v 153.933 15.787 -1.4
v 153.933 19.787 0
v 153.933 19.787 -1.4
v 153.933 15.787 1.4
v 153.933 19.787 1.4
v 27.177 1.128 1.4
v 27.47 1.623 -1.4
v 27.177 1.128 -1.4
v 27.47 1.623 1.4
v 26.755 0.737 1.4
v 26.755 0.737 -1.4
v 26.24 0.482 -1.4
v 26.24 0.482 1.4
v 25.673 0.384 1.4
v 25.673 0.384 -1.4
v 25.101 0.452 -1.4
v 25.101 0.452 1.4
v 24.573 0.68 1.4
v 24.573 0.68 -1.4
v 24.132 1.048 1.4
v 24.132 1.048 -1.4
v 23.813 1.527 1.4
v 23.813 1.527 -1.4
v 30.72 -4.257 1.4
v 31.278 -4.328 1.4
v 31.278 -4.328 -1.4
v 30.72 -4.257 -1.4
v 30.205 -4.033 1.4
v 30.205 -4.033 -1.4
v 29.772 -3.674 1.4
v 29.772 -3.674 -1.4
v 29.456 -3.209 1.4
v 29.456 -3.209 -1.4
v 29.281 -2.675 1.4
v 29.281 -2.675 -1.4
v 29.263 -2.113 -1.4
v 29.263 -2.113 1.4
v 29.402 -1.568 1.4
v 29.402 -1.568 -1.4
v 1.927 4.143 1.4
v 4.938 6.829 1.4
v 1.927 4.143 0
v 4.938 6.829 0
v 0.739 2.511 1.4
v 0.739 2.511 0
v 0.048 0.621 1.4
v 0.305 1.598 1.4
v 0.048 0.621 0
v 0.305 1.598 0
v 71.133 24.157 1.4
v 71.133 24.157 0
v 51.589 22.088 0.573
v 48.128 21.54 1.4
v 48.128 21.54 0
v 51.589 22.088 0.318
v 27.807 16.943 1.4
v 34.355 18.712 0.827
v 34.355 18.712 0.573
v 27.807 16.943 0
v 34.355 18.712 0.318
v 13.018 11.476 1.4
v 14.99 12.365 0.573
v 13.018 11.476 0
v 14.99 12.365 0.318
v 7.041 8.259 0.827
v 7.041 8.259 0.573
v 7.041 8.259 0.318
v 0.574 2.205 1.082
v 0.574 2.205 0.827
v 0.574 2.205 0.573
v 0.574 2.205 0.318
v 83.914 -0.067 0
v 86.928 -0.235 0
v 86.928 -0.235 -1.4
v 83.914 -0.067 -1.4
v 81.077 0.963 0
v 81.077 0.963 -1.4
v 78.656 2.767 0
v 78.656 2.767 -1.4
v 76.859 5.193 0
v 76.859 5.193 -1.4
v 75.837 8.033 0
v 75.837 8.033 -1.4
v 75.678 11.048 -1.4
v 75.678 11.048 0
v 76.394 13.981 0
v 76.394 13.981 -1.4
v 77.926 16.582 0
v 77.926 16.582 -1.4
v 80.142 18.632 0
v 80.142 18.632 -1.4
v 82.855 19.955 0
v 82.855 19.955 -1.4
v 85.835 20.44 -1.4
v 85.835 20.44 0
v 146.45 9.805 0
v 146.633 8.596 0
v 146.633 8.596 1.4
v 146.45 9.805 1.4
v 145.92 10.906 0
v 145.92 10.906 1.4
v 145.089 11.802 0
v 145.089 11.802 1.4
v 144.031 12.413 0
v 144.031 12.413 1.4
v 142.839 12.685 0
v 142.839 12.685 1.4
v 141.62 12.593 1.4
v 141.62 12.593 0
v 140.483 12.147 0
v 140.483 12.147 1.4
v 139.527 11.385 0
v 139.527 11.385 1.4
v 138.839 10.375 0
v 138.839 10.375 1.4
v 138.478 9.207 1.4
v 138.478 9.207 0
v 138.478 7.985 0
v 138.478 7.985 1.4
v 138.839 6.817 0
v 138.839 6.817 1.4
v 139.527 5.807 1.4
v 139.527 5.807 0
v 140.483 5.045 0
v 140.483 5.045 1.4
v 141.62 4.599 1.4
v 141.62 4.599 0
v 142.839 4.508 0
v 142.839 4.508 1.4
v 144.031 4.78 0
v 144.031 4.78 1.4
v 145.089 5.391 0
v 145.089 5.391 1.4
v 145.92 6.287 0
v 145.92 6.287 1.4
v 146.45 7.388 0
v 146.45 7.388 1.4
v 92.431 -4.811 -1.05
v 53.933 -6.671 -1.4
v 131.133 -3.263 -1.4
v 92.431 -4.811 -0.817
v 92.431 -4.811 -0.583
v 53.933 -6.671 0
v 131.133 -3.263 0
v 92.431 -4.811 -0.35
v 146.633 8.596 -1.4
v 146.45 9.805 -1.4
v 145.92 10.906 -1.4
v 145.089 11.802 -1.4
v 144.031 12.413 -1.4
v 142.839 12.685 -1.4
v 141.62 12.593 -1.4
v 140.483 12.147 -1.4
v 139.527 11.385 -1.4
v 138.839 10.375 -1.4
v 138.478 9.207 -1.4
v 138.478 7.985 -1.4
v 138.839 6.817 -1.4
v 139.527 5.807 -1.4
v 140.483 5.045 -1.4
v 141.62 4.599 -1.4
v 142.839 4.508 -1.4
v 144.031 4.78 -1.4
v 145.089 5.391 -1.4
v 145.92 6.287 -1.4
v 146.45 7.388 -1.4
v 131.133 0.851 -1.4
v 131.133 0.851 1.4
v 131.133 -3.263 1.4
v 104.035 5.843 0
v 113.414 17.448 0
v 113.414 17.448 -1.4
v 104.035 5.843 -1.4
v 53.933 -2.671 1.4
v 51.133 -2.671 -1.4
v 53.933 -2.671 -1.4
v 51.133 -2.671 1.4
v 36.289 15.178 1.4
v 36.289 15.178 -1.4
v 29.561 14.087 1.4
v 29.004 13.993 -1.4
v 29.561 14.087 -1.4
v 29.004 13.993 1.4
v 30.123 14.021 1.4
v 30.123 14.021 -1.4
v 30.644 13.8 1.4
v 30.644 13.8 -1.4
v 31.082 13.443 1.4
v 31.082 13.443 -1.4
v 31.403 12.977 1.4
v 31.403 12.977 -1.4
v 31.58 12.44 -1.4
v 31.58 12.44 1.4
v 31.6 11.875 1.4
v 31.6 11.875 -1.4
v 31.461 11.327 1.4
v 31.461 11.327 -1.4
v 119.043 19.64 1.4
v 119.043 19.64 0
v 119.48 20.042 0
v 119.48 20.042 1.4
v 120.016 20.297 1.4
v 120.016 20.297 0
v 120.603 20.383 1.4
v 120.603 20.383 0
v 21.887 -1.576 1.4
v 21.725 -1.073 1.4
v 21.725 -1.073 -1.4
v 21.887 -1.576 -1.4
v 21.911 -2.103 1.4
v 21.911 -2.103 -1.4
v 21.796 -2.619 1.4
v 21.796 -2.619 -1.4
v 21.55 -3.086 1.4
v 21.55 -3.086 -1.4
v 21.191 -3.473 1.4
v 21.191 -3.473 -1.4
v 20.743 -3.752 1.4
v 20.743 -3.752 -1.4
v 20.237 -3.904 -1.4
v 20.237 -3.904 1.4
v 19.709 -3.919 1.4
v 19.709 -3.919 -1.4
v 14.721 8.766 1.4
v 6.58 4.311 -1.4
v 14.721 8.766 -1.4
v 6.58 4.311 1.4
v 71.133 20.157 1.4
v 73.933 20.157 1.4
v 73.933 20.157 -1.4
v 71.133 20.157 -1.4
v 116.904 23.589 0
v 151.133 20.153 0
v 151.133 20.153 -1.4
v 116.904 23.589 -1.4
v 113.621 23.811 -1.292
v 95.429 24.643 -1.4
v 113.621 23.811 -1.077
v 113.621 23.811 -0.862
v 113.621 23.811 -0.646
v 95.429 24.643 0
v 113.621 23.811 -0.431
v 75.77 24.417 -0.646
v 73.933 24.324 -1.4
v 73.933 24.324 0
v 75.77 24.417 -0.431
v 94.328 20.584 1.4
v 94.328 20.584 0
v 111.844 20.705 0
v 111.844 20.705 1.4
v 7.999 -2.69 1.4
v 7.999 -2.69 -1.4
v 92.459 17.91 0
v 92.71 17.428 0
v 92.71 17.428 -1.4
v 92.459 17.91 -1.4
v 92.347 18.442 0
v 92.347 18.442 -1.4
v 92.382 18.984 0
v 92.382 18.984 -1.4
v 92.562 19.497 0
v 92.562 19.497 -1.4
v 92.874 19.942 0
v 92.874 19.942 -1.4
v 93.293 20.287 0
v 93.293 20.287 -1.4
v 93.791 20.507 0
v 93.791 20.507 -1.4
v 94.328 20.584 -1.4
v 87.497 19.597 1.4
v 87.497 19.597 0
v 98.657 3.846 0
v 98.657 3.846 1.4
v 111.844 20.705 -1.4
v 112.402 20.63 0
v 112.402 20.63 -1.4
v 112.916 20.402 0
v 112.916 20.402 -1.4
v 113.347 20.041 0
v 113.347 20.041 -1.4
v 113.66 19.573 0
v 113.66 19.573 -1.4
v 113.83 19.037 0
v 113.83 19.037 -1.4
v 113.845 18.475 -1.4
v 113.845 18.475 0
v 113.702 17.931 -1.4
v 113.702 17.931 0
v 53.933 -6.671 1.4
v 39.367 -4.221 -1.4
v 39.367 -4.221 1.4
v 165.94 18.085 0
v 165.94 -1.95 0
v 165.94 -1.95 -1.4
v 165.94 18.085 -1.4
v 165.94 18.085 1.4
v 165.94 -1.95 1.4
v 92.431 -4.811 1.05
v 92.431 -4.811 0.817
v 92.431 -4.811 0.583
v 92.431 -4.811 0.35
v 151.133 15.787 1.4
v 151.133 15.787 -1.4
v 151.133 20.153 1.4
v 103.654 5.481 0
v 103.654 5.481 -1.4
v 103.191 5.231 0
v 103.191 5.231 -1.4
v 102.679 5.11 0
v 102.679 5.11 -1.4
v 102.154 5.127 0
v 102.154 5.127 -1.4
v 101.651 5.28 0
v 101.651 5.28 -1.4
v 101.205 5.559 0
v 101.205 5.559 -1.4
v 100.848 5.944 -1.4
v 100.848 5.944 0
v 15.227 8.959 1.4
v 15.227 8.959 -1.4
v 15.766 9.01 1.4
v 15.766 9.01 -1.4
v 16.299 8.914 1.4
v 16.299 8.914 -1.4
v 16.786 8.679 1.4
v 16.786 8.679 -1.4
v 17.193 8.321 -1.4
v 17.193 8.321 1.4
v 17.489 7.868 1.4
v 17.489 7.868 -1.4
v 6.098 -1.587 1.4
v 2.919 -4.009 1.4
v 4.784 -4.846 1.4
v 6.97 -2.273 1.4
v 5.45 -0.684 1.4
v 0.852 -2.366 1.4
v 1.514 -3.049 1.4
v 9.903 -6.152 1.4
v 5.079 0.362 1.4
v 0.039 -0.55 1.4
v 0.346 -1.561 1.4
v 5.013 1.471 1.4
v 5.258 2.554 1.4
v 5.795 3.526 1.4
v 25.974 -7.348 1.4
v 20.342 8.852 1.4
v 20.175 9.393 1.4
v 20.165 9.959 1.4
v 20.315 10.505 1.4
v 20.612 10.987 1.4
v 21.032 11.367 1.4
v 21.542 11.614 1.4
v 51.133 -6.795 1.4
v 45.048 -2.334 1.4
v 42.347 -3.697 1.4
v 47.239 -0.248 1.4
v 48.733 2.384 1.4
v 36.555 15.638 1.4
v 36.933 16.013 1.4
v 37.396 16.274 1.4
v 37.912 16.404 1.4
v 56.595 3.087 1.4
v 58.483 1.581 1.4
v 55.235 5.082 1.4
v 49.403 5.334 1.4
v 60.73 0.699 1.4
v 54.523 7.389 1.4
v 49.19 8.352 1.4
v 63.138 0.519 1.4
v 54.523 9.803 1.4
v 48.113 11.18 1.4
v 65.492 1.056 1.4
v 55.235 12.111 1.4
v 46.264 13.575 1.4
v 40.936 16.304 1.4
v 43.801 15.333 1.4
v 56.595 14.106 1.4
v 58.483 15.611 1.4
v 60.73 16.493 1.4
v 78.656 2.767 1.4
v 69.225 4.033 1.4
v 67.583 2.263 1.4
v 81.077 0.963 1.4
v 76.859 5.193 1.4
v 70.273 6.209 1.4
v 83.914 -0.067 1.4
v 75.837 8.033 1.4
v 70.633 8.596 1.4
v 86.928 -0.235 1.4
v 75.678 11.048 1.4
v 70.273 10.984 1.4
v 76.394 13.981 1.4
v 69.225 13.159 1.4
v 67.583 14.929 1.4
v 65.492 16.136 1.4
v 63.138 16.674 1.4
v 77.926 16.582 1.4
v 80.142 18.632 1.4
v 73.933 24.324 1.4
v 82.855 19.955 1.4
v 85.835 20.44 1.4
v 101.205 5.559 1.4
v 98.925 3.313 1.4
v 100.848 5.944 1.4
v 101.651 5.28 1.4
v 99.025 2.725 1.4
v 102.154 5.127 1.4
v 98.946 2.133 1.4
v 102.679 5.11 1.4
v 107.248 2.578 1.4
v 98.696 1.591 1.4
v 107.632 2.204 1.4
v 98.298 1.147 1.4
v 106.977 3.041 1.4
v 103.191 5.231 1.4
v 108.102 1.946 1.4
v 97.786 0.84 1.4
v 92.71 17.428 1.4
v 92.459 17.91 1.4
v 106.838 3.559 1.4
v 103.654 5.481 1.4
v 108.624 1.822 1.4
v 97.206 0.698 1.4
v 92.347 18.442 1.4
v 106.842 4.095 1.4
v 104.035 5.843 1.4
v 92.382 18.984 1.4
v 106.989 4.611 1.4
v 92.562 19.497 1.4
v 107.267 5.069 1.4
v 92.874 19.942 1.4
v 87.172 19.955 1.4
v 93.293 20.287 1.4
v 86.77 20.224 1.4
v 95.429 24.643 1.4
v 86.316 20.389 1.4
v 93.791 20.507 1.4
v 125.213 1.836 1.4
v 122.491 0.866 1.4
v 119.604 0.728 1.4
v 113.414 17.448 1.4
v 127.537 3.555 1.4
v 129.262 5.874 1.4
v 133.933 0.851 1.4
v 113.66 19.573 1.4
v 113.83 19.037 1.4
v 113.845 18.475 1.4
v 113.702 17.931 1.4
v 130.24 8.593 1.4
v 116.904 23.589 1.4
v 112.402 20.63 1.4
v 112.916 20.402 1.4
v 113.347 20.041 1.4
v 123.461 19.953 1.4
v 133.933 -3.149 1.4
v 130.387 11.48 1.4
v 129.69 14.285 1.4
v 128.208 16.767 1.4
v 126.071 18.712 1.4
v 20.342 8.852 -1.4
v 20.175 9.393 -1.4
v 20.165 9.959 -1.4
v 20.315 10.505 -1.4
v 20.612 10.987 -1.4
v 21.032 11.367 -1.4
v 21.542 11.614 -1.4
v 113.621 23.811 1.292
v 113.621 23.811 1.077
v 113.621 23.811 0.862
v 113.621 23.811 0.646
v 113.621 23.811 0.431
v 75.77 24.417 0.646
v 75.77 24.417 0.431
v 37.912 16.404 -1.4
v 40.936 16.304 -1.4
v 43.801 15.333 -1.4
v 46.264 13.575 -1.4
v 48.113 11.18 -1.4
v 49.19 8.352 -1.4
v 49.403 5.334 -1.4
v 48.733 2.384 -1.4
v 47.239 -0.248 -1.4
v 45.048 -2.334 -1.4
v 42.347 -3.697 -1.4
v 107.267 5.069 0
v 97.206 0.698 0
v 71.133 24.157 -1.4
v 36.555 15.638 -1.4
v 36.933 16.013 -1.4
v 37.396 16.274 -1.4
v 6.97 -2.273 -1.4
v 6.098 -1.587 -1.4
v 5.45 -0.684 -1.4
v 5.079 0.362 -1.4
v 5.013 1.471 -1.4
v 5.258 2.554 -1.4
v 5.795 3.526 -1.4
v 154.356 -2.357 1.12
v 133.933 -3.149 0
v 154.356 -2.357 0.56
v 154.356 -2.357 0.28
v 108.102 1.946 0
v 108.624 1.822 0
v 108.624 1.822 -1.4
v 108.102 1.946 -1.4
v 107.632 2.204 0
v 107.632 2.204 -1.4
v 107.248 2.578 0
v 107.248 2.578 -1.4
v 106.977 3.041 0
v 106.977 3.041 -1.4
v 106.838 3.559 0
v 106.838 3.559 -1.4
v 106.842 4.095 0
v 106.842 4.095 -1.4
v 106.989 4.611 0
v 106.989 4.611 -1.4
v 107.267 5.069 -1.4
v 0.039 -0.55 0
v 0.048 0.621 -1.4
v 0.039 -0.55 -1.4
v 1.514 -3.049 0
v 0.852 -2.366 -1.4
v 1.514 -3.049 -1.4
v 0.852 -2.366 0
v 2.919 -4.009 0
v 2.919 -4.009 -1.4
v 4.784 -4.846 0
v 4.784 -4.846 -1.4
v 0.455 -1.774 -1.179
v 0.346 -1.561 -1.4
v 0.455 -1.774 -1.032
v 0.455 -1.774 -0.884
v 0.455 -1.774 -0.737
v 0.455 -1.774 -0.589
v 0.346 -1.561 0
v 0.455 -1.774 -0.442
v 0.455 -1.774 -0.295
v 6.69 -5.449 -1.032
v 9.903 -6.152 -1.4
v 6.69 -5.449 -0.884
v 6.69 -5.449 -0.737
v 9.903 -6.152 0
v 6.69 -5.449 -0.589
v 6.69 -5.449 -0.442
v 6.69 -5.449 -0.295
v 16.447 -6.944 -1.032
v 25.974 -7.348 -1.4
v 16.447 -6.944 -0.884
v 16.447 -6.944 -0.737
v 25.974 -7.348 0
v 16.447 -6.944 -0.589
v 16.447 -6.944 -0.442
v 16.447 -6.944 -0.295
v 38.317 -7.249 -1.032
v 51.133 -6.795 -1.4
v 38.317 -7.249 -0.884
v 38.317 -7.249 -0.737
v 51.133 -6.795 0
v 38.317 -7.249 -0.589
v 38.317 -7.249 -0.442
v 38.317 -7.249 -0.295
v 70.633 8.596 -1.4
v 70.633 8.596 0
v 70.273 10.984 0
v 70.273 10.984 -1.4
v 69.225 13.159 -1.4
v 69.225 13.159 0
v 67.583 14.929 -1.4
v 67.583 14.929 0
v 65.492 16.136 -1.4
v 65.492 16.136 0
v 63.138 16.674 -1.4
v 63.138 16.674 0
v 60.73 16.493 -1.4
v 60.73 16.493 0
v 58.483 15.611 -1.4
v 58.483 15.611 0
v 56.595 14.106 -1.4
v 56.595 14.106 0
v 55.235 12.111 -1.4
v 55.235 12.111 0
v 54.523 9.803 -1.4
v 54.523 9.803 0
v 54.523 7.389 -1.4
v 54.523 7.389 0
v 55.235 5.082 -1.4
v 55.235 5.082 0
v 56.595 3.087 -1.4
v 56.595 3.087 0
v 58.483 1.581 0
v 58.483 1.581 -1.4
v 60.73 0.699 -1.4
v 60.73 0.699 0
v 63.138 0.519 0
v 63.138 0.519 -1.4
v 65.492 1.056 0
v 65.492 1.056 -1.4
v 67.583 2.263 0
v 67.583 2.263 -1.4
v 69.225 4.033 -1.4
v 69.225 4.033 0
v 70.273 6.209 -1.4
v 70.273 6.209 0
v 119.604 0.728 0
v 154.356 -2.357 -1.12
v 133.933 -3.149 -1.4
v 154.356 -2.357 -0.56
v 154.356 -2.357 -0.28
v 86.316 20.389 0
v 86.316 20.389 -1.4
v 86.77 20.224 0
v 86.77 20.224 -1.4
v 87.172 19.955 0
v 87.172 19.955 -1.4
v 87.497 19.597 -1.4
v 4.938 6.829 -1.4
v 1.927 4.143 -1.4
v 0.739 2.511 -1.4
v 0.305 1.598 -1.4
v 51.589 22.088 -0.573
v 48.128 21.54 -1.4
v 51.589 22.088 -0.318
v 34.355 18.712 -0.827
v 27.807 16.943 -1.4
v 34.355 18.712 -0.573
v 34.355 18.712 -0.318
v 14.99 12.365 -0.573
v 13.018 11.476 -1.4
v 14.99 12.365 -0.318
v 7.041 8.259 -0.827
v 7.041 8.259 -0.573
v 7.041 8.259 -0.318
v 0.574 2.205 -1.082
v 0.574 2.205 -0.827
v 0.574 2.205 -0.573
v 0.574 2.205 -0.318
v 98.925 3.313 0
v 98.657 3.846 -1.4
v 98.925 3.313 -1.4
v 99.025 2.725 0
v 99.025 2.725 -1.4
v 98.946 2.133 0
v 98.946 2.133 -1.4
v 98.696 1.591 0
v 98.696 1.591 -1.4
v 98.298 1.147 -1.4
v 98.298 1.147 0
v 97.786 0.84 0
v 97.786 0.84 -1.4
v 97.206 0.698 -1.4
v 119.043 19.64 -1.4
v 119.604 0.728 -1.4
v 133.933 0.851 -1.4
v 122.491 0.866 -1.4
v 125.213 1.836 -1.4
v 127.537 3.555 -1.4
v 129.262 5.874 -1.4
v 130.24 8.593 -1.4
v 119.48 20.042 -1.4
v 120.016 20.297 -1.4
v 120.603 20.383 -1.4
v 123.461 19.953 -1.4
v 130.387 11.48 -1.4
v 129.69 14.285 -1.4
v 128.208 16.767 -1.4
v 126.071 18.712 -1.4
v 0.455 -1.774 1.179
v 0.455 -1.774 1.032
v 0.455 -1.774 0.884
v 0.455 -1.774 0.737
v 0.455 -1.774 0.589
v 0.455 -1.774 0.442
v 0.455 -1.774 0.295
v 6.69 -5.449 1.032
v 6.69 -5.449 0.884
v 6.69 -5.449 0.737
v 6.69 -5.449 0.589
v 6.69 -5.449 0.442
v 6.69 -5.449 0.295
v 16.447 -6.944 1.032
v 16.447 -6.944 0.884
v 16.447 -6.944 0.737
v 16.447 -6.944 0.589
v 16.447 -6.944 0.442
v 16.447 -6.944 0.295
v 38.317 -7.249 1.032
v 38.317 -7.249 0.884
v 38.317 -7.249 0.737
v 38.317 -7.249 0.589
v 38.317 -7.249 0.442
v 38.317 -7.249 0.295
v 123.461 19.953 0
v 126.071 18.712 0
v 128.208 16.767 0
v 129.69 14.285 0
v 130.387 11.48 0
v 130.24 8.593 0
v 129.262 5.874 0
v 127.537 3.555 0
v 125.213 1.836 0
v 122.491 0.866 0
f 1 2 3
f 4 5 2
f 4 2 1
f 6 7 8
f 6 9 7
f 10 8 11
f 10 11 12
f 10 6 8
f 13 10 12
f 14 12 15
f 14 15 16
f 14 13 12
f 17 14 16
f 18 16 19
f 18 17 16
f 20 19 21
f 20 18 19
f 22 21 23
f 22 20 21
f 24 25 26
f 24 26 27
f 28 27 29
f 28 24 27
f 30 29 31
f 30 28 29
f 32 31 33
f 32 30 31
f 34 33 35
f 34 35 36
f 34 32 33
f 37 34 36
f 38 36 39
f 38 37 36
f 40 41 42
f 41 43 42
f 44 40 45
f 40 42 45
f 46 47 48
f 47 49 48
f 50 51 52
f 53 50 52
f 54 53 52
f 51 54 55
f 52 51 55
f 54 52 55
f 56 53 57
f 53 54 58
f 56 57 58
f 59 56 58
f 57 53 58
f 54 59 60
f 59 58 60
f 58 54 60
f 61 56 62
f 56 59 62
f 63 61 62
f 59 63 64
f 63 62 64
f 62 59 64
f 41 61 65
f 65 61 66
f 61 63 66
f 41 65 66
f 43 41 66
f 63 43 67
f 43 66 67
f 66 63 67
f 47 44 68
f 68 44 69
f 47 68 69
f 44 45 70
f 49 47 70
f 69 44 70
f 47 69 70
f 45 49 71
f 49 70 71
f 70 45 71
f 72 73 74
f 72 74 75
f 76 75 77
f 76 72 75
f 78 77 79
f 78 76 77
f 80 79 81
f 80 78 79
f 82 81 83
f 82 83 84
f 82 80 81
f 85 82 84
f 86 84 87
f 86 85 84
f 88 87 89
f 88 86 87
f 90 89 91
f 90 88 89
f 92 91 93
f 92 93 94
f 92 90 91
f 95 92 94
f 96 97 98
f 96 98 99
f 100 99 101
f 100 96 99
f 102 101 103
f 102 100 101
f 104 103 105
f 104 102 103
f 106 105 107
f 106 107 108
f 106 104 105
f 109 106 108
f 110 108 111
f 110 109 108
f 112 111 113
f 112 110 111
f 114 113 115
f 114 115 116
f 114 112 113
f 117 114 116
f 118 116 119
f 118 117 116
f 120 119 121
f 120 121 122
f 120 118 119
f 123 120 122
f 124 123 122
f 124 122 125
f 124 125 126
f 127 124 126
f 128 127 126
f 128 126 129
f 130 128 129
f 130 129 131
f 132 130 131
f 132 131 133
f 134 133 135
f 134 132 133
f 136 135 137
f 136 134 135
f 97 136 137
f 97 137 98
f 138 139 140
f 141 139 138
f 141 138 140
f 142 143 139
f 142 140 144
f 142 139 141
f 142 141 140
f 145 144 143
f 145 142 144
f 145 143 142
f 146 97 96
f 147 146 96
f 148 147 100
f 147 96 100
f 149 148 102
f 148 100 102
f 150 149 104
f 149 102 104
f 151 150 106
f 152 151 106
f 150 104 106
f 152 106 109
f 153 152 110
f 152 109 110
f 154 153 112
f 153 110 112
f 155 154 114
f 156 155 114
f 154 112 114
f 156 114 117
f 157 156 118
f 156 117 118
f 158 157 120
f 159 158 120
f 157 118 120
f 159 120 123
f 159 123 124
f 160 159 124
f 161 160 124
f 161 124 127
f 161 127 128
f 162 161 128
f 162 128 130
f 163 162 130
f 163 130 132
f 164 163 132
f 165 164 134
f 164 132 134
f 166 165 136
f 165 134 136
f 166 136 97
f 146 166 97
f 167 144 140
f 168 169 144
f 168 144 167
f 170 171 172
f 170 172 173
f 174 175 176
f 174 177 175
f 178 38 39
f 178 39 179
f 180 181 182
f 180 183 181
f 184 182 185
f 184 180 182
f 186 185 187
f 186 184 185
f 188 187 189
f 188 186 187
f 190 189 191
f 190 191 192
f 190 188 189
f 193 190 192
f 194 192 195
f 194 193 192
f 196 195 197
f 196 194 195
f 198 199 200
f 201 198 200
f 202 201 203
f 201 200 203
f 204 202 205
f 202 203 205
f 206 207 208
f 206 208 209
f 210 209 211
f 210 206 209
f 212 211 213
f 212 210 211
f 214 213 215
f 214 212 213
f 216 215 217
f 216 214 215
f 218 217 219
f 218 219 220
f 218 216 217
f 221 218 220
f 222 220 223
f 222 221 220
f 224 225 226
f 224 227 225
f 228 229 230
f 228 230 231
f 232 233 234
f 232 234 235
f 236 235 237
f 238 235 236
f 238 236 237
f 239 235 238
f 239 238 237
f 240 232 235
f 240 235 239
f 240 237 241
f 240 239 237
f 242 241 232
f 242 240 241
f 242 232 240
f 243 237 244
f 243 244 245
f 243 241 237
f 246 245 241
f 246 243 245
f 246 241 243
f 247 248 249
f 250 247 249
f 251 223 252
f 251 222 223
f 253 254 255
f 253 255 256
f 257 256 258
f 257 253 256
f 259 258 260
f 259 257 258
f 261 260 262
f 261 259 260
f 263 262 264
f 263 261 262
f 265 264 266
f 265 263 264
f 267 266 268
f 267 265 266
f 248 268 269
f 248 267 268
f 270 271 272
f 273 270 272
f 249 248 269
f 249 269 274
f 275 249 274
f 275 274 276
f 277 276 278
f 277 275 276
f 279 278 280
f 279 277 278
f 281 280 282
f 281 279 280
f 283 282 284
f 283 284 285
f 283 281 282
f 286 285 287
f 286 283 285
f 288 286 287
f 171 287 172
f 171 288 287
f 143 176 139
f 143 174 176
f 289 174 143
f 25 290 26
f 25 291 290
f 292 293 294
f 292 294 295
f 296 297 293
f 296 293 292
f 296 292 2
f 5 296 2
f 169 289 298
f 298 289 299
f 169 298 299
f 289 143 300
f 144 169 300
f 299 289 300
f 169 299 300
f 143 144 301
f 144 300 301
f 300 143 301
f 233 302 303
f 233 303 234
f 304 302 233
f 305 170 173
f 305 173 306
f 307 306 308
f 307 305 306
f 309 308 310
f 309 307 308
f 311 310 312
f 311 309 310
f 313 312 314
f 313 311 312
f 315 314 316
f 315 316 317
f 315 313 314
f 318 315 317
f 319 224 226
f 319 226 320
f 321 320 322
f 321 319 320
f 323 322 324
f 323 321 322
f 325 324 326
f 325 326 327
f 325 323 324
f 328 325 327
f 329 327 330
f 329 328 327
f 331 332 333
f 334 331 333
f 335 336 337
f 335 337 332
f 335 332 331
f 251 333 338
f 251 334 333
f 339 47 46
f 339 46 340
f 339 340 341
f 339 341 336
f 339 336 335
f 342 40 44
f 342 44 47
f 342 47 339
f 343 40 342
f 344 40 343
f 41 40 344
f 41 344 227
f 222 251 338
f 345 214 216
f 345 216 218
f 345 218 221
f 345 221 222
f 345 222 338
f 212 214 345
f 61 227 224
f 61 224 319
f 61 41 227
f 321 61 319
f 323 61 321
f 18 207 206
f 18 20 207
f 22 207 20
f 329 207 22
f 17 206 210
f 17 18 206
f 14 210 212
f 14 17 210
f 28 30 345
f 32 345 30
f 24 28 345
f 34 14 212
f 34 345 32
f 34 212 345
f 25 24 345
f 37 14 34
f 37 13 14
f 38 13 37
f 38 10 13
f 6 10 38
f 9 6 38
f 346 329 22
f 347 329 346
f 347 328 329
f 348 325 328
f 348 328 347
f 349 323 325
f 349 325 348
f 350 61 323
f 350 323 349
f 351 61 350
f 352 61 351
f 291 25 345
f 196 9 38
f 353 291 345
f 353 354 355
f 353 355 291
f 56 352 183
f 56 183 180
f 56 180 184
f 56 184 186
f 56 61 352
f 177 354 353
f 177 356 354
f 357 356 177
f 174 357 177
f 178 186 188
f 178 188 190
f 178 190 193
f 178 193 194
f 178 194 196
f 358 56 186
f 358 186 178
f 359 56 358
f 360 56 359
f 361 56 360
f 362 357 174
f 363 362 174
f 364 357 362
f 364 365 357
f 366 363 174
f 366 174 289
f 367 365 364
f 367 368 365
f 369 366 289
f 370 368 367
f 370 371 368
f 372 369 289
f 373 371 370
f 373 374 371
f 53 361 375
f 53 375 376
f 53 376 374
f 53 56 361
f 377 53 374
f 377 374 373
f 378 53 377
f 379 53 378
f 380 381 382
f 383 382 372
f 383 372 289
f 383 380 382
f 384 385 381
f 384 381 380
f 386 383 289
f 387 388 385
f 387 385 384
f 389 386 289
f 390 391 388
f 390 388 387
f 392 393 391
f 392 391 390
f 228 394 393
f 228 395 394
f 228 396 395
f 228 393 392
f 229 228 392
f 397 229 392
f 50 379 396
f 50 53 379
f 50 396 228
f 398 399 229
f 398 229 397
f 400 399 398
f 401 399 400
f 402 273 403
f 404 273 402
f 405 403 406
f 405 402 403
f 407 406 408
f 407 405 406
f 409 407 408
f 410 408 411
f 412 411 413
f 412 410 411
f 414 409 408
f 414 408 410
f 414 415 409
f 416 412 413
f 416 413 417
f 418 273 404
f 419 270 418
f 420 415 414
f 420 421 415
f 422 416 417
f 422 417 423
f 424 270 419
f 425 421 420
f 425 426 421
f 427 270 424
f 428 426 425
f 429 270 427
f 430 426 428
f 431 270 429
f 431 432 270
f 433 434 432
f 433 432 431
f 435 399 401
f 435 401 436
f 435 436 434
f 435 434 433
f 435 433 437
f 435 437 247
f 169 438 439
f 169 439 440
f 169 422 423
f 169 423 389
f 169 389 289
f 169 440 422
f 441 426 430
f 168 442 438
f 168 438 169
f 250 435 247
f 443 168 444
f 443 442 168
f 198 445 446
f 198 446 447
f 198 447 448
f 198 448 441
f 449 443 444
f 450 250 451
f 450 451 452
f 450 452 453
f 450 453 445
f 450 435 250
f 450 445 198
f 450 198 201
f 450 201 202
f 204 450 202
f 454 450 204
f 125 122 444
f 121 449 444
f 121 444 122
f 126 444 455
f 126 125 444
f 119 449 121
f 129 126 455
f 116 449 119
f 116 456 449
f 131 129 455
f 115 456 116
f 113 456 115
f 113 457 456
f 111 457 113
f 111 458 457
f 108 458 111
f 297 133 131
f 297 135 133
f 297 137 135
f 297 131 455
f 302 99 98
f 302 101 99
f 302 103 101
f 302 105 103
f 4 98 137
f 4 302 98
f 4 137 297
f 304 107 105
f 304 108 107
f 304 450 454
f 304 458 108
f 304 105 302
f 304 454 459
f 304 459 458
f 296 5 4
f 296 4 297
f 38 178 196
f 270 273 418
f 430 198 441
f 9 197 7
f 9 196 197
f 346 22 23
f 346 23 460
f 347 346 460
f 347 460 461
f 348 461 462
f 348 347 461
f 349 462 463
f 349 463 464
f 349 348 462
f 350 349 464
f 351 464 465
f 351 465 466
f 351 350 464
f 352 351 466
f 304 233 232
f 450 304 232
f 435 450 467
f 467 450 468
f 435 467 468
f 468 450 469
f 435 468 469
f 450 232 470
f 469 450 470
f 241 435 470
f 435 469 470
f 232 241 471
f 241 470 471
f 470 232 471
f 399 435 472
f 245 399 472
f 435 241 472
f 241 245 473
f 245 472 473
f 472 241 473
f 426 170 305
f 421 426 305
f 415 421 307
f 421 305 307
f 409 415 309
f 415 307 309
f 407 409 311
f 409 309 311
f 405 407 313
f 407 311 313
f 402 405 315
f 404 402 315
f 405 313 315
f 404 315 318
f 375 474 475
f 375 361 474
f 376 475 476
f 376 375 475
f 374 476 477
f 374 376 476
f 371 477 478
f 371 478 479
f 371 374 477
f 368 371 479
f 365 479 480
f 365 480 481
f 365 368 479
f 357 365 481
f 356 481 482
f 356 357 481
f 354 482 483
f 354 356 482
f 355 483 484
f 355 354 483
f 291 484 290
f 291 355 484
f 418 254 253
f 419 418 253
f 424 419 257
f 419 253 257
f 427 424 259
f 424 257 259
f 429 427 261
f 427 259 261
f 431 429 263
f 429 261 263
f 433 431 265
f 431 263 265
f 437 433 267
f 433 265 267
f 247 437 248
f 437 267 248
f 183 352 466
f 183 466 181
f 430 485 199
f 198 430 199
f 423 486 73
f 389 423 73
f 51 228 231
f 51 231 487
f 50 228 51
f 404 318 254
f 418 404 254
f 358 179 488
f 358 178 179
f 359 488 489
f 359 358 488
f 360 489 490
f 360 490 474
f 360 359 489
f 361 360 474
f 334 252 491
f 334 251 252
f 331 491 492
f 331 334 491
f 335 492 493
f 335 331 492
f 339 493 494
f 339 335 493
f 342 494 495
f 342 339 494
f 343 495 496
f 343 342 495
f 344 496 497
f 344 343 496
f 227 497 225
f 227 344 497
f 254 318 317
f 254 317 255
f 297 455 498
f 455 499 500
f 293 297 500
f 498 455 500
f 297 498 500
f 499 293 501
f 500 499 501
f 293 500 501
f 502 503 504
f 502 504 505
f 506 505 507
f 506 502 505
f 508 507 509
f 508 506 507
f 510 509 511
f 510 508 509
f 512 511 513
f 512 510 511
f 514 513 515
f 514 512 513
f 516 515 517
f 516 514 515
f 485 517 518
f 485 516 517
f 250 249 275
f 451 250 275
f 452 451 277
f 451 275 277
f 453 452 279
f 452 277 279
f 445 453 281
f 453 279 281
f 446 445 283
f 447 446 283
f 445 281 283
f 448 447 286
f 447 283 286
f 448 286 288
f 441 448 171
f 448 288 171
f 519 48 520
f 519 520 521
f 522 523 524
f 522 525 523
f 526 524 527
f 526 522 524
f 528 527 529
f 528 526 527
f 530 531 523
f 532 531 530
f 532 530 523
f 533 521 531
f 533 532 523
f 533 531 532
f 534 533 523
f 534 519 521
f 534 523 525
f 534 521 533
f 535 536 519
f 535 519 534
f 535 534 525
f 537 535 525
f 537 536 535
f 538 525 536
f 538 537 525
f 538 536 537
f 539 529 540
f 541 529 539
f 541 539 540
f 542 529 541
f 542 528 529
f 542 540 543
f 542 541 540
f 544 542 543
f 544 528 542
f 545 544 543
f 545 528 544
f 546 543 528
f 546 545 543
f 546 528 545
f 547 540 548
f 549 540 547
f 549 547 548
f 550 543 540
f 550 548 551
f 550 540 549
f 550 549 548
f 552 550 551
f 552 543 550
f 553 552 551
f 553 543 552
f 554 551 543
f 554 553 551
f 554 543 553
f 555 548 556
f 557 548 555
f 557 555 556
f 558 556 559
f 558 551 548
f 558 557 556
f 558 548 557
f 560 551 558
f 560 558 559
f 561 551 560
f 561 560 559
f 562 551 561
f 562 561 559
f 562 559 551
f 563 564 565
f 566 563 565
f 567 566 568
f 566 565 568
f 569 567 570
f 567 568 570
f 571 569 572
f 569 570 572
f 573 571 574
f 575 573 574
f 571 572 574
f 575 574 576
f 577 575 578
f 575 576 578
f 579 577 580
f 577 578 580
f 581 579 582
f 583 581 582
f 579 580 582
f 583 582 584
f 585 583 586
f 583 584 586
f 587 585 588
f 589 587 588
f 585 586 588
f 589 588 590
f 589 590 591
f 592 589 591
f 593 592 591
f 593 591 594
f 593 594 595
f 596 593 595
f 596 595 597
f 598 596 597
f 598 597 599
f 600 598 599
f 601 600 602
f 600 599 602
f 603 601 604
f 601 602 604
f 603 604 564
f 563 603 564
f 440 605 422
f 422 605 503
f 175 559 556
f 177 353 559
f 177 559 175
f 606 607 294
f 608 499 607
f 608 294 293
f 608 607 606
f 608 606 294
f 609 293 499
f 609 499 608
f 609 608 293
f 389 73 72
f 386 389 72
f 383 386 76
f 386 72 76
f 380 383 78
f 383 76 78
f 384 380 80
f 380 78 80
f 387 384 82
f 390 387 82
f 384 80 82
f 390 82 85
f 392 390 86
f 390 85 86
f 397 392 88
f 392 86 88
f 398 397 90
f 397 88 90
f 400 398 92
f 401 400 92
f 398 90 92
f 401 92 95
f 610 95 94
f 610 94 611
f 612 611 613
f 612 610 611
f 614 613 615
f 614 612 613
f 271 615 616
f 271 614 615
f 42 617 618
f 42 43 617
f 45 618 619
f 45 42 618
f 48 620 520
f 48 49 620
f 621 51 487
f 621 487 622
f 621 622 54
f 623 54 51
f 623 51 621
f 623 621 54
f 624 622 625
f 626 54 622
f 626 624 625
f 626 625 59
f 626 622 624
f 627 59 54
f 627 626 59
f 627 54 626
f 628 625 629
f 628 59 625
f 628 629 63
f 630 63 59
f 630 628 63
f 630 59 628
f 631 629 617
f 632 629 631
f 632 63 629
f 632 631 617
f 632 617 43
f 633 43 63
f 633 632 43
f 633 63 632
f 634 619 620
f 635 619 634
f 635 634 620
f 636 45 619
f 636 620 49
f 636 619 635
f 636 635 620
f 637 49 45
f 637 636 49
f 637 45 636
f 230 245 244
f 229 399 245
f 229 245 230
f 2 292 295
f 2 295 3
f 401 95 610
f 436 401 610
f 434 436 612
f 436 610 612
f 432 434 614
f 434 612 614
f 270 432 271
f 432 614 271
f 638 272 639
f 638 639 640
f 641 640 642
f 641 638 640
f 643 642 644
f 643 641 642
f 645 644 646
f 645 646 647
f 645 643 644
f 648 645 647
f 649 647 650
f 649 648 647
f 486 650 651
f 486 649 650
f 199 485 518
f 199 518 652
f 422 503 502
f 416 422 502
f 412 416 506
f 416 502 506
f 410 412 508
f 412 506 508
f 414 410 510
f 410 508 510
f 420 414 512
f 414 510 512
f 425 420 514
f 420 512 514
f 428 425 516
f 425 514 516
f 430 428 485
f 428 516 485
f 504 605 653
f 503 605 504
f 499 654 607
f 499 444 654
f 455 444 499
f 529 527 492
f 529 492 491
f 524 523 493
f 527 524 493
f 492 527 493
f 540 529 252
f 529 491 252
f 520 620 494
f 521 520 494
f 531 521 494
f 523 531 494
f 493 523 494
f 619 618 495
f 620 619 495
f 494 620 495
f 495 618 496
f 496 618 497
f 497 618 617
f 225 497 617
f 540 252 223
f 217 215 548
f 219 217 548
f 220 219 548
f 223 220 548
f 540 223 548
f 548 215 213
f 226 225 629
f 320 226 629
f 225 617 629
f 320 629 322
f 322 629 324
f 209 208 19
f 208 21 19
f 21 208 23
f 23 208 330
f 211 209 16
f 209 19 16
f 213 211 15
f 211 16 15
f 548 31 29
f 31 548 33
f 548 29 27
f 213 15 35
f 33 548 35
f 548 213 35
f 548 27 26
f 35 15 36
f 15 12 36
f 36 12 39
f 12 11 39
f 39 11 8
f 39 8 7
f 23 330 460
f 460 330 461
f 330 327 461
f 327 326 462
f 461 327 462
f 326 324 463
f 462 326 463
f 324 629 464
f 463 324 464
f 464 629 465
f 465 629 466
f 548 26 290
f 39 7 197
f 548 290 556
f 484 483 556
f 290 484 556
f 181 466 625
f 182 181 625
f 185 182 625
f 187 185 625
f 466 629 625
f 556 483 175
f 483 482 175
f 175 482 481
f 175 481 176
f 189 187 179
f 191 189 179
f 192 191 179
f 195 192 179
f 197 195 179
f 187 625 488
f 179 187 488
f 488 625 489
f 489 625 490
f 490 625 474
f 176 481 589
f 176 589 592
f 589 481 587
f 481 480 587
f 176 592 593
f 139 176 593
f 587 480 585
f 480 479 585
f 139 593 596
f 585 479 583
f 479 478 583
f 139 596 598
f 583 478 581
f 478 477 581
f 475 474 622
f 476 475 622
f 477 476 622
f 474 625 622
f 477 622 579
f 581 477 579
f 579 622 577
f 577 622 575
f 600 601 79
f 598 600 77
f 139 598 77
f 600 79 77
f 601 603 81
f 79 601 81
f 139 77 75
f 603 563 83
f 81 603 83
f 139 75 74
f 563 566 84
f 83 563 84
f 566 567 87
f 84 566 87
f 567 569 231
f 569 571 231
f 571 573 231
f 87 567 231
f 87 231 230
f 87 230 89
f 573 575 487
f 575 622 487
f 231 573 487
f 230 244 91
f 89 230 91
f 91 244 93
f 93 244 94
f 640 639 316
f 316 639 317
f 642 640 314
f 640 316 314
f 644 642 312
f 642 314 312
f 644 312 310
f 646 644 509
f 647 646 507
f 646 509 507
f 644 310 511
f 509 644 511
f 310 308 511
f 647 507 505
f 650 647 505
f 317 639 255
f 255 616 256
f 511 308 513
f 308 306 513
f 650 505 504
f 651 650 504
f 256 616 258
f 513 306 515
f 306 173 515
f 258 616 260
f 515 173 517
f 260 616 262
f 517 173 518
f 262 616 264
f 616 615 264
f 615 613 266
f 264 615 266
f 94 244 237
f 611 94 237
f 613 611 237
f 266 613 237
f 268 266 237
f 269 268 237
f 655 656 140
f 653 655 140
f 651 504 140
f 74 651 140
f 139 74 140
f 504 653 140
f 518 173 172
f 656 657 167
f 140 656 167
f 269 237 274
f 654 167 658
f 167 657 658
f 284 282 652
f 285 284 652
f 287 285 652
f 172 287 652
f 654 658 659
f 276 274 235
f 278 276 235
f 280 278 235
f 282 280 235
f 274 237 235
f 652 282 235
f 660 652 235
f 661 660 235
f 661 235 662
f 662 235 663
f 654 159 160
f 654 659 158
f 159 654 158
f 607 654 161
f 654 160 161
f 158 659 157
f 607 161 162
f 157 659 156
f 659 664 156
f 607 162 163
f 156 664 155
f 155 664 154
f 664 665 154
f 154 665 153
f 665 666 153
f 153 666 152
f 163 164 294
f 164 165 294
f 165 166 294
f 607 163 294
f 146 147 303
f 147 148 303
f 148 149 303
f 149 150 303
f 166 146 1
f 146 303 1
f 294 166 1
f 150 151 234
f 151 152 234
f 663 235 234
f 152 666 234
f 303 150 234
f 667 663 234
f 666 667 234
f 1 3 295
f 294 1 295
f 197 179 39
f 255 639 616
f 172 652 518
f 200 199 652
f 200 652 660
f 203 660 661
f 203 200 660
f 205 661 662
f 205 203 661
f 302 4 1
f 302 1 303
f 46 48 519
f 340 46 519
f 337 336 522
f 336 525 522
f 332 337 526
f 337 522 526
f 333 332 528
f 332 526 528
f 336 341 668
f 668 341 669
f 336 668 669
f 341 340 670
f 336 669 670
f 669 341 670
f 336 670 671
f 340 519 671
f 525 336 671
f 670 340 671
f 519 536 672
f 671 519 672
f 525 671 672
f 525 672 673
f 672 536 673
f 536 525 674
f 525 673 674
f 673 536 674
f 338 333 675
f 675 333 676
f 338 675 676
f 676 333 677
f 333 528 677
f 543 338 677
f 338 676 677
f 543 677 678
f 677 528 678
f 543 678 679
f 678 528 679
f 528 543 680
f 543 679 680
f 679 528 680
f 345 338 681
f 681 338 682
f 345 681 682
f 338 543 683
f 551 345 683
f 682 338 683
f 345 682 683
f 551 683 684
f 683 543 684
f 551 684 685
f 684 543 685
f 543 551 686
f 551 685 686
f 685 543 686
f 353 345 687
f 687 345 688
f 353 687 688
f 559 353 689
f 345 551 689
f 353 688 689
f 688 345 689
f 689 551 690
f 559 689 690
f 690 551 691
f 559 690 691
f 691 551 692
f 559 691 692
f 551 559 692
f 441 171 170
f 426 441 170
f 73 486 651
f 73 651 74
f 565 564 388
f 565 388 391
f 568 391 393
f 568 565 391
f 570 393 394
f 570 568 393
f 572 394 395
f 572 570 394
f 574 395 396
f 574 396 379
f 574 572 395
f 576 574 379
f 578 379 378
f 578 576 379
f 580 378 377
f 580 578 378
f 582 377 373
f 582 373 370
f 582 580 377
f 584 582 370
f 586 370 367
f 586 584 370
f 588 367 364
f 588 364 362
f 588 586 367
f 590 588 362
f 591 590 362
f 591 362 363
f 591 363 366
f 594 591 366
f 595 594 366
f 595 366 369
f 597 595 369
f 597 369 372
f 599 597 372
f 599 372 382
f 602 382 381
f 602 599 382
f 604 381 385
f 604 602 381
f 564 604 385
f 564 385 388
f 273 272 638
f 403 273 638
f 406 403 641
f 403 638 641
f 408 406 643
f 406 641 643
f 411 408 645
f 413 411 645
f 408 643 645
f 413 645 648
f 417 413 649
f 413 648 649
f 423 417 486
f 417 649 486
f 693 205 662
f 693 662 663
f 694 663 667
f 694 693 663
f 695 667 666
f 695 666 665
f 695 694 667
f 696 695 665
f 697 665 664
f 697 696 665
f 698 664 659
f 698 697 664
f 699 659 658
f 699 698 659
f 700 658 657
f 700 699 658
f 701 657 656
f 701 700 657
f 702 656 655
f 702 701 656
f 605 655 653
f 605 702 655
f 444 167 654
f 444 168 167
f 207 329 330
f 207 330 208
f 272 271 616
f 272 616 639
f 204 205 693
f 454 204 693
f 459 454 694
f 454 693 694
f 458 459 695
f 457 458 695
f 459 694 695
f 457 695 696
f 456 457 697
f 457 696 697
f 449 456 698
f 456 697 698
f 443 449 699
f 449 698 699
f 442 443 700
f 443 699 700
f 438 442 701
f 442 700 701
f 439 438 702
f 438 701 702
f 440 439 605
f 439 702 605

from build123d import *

# Parameters (mm, degrees)
SKETCH_2_R      = 8.1
SKETCH_2_R_2    = 4.1
EXTRUDE_2_DEPTH = 1.4


with BuildPart() as part:
    # Эскиз2 → Бобышка-Вытянуть2 (new, symmetric)
    with BuildSketch(Plane.XY):
        with BuildLine():
            Line((165.940456932, 7.493910357), (165.940456932, 18.08535451))
            add(Edge.make_bspline(
                [(165.940456927, 18.085354477), (165.930512982, 18.086853188), (163.740114219, 18.416932942), (159.739714866, 19.000386852), (155.744292591, 19.547112651), (153.932619318, 19.787470759)],
                knots=[0.332761263, 0.332761263, 0.332761263, 0.332761263, 0.332878042, 0.358484538, 0.379707003, 0.379707003, 0.379707003, 0.379707003], degree=3))
            Line((153.932619318, 19.787470759), (153.932619318, 15.787470759))
            Line((153.932619318, 15.787470759), (151.132619318, 15.787470759))
            Line((151.132619318, 15.787470759), (151.132619318, 20.152925753))
            add(Edge.make_bspline(
                [(151.132619318, 20.152925753), (149.51271539, 20.360855756), (145.712882211, 20.834305053), (139.731359791, 21.525676112), (133.19183673, 22.212004248), (126.658683026, 22.825721427), (120.136770918, 23.363973264), (113.62856714, 23.824677322), (107.152732037, 24.200242592), (100.741095693, 24.498399508), (94.411752715, 24.686649766), (88.155917993, 24.740095648), (81.949043055, 24.658849141), (77.212383792, 24.491578654), (74.545027167, 24.35694527), (73.932619318, 24.323871534)],
                knots=[0.390637302, 0.390637302, 0.390637302, 0.390637302, 0.409602822, 0.435103874, 0.460559416, 0.485959195, 0.51130307, 0.536551515, 0.561723366, 0.586628867, 0.611085431, 0.6352512, 0.659272176, 0.683163753, 0.690285585, 0.690285585, 0.690285585, 0.690285585], degree=3))
            Line((73.932619318, 24.323871534), (73.932619318, 20.157469486))
            Line((73.932619318, 20.157469486), (71.132619318, 20.157469486))
            Line((71.132619318, 20.157469486), (71.132619318, 24.157469486))
            add(Edge.make_bspline(
                [(71.132619318, 24.157469486), (70.635982629, 24.125241372), (68.110579653, 23.953963558), (63.575410502, 23.578006358), (57.555189551, 22.924946655), (51.605762689, 22.119065518), (45.744400312, 21.156564429), (39.995857594, 20.035371386), (34.397919843, 18.75631623), (29.010382104, 17.327615604), (23.925798409, 15.771864917), (19.27067884, 14.13426943), (15.179098392, 12.483335433), (11.740475791, 10.89561099), (8.959371869, 9.429577361), (6.760891181, 8.108603195), (5.033709749, 6.92463805), (3.671694934, 5.85422966), (2.592101124, 4.871305364), (1.738175669, 3.952595739), (1.069870831, 3.080946369), (0.571645411, 2.241622098), (0.2157739, 1.430785392), (0.102255582, 0.88324169), (0.047975001, 0.621424995)],
                knots=[0.701142916, 0.701142916, 0.701142916, 0.701142916, 0.706922144, 0.73053591, 0.7539832, 0.77723469, 0.800246382, 0.822950709, 0.845237155, 0.866915896, 0.887662335, 0.906968281, 0.924203157, 0.938878975, 0.950931611, 0.960693484, 0.968646729, 0.975232933, 0.980794744, 0.985583761, 0.989781539, 0.993521313, 0.996902113, 1, 1, 1, 1], degree=3))
            add(Edge.make_bspline(
                [(0.047975001, 0.621424995), (0.022713821, 0.373490081), (-0.027820788, -0.12249998), (0.077991213, -0.884434595), (0.349695651, -1.638838075), (0.814331136, -2.365068928), (1.463480781, -3.039275249), (2.290973018, -3.660999474), (3.305928751, -4.235779626), (4.53525562, -4.773674148), (6.029745689, -5.282192169), (7.868981216, -5.765316681), (10.168831393, -6.221716597), (13.07543819, -6.639618735), (16.728115364, -6.992956742), (21.189952097, -7.247345149), (26.399984417, -7.376638853), (32.197398565, -7.376256917), (38.39780676, -7.261436583), (44.752137938, -7.05998551), (49.023344092, -6.886827907), (51.132619318, -6.795360627)],
                knots=[0, 0, 0, 0, 0.002941446, 0.005884319, 0.00901613, 0.012364547, 0.016007934, 0.020036845, 0.024573728, 0.029783835, 0.03589701, 0.04324044, 0.052275965, 0.063634589, 0.077983176, 0.095698161, 0.116520086, 0.13966073, 0.16431217, 0.18991889, 0.214908072, 0.214908072, 0.214908072, 0.214908072], degree=3))
            Line((51.132619318, -6.795360627), (51.132619318, -2.670677263))
            Line((51.132619318, -2.670677263), (53.932619318, -2.670677263))
            Line((53.932619318, -2.670677263), (53.932619318, -6.670677263))
            add(Edge.make_bspline(
                [(53.932619318, -6.670677263), (55.356569482, -6.605720394), (59.058679651, -6.431131786), (65.052094606, -6.13285227), (71.91077271, -5.784005184), (78.771375577, -5.439680462), (85.61049861, -5.110951262), (92.43210759, -4.804953337), (99.255031191, -4.531981668), (106.097378406, -4.278274685), (112.969211681, -4.003089942), (119.864404255, -3.723176202), (125.92308308, -3.47492717), (129.679854903, -3.321735217), (131.132619318, -3.262735091)],
                knots=[0.225966113, 0.225966113, 0.225966113, 0.225966113, 0.242837762, 0.269833583, 0.296993022, 0.324123272, 0.351139107, 0.378035509, 0.404946016, 0.431960837, 0.459078395, 0.4863474, 0.51364083, 0.530850189, 0.530850189, 0.530850189, 0.530850189], degree=3))
            Line((131.132619318, -3.262735091), (131.132619318, 0.850647814))
            Line((131.132619318, 0.850647814), (133.932619318, 0.850647814))
            Line((133.932619318, 0.850647814), (133.932619318, -3.149352186))
            add(Edge.make_bspline(
                [(133.932619318, -3.149352186), (136.150252366, -3.05984138), (140.66441482, -2.879164577), (147.472013762, -2.613922958), (154.352602411, -2.355626415), (160.507662095, -2.135075484), (164.369425992, -2.00299999), (165.940456932, -1.950382964)],
                knots=[0.541906346, 0.541906346, 0.541906346, 0.541906346, 0.568176028, 0.595379569, 0.622543445, 0.64967326, 0.668278692, 0.668278692, 0.668278692, 0.668278692], degree=3))
            Line((165.940456932, -1.950382964), (165.940456932, 7.493910357))
        make_face()
        with BuildLine():
            ThreePointArc((14.721240391, 8.766081587), (16.29867531, 8.913940332), (17.488708089, 7.868002897))
            Line((17.488708089, 7.868002897), (21.725441093, -1.073266618))
            ThreePointArc((21.725441093, -1.073266618), (21.549996986, -3.085882804), (19.709418924, -3.918755509))
            Line((19.709418924, -3.918755509), (7.999391348, -2.690370853))
            ThreePointArc((7.999391348, -2.690370853), (5.078852056, 0.362162442), (6.580135706, 4.311042875))
            Line((6.580135706, 4.311042875), (14.721240391, 8.766081587))
        make_face(mode=Mode.SUBTRACT)
        with BuildLine():
            Line((23.813024955, 1.527110532), (20.342244628, 8.85190119))
            ThreePointArc((20.342244628, 8.85190119), (20.315234657, 10.50521233), (21.542097769, 11.613803404))
            Line((21.542097769, 11.613803404), (29.003823035, 13.992759157))
            ThreePointArc((29.003823035, 13.992759157), (31.082028751, 13.44264333), (31.461008962, 11.326528867))
            Line((31.461008962, 11.326528867), (27.470064023, 1.622782457))
            ThreePointArc((27.470064023, 1.622782457), (25.672695714, 0.384197539), (23.813024955, 1.527110532))
        make_face(mode=Mode.SUBTRACT)
        with BuildLine():
            ThreePointArc((31.277857225, -4.328453595), (29.59717908, -3.452864074), (29.401621993, -1.567898965))
            Line((29.401621993, -1.567898965), (36.28872379, 15.177681436))
            ThreePointArc((36.28872379, 15.177681436), (36.93262885, 16.01260855), (37.911651949, 16.404055587))
            ThreePointArc((37.911651949, 16.404055587), (49.40696202, 6.85120019), (39.366777065, -4.221012142))
            Line((39.366777065, -4.221012142), (31.277857225, -4.328453595))
        make_face(mode=Mode.SUBTRACT)
        with Locations((62.532619318, 8.596197208)):
            Circle(SKETCH_2_R, mode=Mode.SUBTRACT)
        with Locations((142.532619318, 8.596197208)):
            Circle(SKETCH_2_R_2, mode=Mode.SUBTRACT)
        with BuildLine():
            ThreePointArc((85.834710285, 20.440331448), (86.770100886, 20.22407123), (87.496942629, 19.59683512))
            Line((87.496942629, 19.59683512), (98.656957359, 3.846404038))
            ThreePointArc((98.656957359, 3.846404038), (98.841412786, 1.852917443), (97.205894504, 0.698321168))
            Line((97.205894504, 0.698321168), (86.928494978, -0.234664059))
            ThreePointArc((86.928494978, -0.234664059), (75.647085804, 9.534937552), (85.834710285, 20.440331448))
        make_face(mode=Mode.SUBTRACT)
        with BuildLine():
            ThreePointArc((108.623842739, 1.821697682), (106.976814232, 3.040567769), (107.26658781, 5.068960843))
            Line((107.26658781, 5.068960843), (119.042711354, 19.640469699))
            ThreePointArc((119.042711354, 19.640469699), (119.738361249, 20.189071191), (120.602738696, 20.383349351))
            ThreePointArc((120.602738696, 20.383349351), (130.419922424, 10.031300237), (119.603876283, 0.727797506))
            Line((119.603876283, 0.727797506), (108.623842739, 1.821697682))
        make_face(mode=Mode.SUBTRACT)
        with BuildLine():
            Line((100.847534604, 5.943867476), (92.710261403, 17.428221559))
            ThreePointArc((92.710261403, 17.428221559), (92.562400415, 19.496921566), (94.32837603, 20.584447529))
            Line((94.32837603, 20.584447529), (111.84428559, 20.7050059))
            ThreePointArc((111.84428559, 20.7050059), (113.659822033, 19.573166514), (113.413576859, 17.447937989))
            Line((113.413576859, 17.447937989), (104.034940499, 5.843025535))
            ThreePointArc((104.034940499, 5.843025535), (102.41617089, 5.101141005), (100.847534604, 5.943867476))
        make_face(mode=Mode.SUBTRACT)
    extrude(amount=EXTRUDE_2_DEPTH, both=True)


solid = part.part
